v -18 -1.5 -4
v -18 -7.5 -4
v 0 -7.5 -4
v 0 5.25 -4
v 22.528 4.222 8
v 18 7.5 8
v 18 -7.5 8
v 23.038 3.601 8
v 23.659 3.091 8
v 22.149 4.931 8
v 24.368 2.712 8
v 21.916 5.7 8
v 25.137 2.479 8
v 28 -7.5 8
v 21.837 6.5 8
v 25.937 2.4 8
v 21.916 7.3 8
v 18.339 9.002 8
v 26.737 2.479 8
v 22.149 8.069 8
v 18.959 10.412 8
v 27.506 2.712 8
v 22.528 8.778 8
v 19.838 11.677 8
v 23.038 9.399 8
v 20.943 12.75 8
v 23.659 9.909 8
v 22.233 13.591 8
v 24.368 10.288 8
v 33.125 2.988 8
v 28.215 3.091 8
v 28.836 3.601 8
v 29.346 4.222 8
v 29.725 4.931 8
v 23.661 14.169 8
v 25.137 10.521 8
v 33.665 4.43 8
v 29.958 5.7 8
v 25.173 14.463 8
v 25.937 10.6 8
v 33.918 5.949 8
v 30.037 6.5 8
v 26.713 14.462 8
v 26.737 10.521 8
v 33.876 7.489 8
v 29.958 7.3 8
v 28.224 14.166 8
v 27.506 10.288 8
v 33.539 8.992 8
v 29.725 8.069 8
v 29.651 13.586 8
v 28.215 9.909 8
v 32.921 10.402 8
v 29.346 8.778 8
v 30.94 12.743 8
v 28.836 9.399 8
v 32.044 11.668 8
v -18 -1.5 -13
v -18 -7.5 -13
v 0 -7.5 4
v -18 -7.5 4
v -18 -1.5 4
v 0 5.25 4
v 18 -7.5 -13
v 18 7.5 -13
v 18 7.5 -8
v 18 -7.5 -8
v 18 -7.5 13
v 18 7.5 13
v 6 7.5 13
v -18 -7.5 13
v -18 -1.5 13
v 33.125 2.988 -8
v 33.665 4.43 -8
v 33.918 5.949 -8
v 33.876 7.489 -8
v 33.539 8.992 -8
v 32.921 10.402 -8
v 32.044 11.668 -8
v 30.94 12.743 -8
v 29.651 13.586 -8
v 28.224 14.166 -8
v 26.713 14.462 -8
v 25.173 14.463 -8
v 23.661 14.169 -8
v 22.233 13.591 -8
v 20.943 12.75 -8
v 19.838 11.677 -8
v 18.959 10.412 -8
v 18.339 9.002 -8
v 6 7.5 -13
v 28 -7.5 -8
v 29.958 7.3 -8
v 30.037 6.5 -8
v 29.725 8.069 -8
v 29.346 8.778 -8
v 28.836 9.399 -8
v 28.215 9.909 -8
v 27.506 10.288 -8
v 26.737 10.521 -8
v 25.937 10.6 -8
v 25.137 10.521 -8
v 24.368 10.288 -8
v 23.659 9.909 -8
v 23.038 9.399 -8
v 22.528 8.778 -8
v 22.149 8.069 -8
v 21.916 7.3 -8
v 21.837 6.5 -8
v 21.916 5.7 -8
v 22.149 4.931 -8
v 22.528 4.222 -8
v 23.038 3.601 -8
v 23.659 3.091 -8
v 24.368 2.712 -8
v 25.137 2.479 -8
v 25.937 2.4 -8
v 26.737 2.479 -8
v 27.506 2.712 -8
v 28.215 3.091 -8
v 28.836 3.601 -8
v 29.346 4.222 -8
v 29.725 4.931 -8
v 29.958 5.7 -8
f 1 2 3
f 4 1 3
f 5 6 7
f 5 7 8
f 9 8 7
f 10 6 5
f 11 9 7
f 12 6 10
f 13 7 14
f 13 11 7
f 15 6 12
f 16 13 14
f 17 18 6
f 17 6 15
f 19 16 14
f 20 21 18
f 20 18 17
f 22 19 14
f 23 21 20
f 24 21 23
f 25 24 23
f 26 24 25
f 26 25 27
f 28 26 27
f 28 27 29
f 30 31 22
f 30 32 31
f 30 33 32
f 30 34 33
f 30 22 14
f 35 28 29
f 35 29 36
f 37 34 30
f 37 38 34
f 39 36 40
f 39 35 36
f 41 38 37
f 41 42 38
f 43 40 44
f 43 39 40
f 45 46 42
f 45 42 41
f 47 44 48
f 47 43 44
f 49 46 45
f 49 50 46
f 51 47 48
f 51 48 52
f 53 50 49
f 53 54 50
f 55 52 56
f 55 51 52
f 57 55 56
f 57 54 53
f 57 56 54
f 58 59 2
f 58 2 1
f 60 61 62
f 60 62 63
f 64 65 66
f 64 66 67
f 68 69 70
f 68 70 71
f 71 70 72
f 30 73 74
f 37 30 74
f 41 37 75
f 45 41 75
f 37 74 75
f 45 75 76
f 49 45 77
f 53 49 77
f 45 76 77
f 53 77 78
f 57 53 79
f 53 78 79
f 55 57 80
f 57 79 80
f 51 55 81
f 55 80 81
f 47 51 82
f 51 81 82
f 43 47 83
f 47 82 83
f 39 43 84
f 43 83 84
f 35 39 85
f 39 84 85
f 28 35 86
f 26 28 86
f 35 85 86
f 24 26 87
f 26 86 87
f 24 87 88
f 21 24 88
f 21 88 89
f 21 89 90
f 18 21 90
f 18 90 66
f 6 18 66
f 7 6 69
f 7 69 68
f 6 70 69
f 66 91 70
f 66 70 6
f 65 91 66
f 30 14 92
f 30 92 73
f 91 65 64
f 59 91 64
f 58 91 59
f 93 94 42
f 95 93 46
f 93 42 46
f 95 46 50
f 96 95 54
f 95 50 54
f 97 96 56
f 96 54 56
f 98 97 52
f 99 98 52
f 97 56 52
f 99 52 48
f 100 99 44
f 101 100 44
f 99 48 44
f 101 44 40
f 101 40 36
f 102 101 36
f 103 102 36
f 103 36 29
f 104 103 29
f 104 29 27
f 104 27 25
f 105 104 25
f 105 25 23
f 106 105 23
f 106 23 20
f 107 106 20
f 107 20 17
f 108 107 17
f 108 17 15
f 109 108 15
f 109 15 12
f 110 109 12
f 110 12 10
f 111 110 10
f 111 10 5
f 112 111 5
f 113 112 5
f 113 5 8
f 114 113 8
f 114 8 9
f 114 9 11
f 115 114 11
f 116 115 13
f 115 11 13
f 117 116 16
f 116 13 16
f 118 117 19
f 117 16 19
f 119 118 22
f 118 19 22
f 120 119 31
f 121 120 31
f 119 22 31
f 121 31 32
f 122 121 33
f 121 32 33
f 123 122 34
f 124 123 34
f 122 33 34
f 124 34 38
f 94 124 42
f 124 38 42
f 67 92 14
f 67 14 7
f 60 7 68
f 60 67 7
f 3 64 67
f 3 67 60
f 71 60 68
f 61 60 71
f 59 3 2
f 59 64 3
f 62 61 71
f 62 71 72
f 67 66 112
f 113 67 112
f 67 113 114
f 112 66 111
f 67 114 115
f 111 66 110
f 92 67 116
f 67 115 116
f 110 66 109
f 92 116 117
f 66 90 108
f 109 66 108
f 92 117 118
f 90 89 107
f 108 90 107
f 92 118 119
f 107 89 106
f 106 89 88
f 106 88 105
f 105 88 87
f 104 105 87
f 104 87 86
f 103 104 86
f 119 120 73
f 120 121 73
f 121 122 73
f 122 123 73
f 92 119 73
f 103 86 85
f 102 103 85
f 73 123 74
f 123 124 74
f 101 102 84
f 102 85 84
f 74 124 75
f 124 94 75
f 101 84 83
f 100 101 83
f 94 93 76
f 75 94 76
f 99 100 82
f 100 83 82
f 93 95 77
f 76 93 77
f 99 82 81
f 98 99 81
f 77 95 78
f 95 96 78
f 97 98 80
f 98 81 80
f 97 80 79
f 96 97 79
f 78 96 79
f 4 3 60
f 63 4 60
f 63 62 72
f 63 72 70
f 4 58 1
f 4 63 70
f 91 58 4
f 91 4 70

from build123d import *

# Parameters (mm, degrees)
BOSS_EXTRUDE2_DEPTH      = 13
BOSS_EXTRUDE2_DEPTH_BACK = 13
SKETCH3_W                = 18
SKETCH3_H                = 8
CUT_EXTRUDE2_DEPTH       = 27.795522014
BOSS_EXTRUDE3_DEPTH      = 8
BOSS_EXTRUDE3_DEPTH_BACK = 8
SKETCH5_R                = 4.1
CUT_EXTRUDE3_DEPTH       = 43.46159682


with BuildPart() as part:
    # Sketch1 → Boss-Extrude2 (new, two sides: drawn at the far end of the back side and taken through both)
    with BuildSketch(Plane.XY.offset(-BOSS_EXTRUDE2_DEPTH_BACK)):
        Polygon((-18, -1.5), (6, 7.5), (18, 7.5), (18, -7.5), (-18, -7.5), align=None)
    extrude(amount=BOSS_EXTRUDE2_DEPTH + BOSS_EXTRUDE2_DEPTH_BACK)

    # Sketch3 → Cut-Extrude2 (cut, through all)
    with BuildSketch(Plane.XZ.offset(7.5)):
        with Locations((-9, 0)):
            Rectangle(SKETCH3_W, SKETCH3_H)
    extrude(amount=-CUT_EXTRUDE2_DEPTH, mode=Mode.SUBTRACT)

    # Sketch4 → Boss-Extrude3 (add, two sides: drawn at the far end of the back side and taken through both)
    with BuildSketch(Plane.XY.offset(-BOSS_EXTRUDE3_DEPTH_BACK)):
        with BuildLine():
            Line((18, 7.5), (18, -7.5))
            Line((18, -7.5), (28, -7.5))
            Line((28, -7.5), (33.12495505, 2.987600158))
            ThreePointArc((33.12495505, 2.987600158), (28.224369024, 14.166101001), (18, 7.5))
        make_face()
    extrude(amount=BOSS_EXTRUDE3_DEPTH + BOSS_EXTRUDE3_DEPTH_BACK)

    # Sketch5 → Cut-Extrude3 (cut, through all)
    with BuildSketch(Plane.XY.offset(8)):
        with Locations((25.937253933, 6.5)):
            Circle(SKETCH5_R)
    extrude(amount=-CUT_EXTRUDE3_DEPTH, mode=Mode.SUBTRACT)


solid = part.part
